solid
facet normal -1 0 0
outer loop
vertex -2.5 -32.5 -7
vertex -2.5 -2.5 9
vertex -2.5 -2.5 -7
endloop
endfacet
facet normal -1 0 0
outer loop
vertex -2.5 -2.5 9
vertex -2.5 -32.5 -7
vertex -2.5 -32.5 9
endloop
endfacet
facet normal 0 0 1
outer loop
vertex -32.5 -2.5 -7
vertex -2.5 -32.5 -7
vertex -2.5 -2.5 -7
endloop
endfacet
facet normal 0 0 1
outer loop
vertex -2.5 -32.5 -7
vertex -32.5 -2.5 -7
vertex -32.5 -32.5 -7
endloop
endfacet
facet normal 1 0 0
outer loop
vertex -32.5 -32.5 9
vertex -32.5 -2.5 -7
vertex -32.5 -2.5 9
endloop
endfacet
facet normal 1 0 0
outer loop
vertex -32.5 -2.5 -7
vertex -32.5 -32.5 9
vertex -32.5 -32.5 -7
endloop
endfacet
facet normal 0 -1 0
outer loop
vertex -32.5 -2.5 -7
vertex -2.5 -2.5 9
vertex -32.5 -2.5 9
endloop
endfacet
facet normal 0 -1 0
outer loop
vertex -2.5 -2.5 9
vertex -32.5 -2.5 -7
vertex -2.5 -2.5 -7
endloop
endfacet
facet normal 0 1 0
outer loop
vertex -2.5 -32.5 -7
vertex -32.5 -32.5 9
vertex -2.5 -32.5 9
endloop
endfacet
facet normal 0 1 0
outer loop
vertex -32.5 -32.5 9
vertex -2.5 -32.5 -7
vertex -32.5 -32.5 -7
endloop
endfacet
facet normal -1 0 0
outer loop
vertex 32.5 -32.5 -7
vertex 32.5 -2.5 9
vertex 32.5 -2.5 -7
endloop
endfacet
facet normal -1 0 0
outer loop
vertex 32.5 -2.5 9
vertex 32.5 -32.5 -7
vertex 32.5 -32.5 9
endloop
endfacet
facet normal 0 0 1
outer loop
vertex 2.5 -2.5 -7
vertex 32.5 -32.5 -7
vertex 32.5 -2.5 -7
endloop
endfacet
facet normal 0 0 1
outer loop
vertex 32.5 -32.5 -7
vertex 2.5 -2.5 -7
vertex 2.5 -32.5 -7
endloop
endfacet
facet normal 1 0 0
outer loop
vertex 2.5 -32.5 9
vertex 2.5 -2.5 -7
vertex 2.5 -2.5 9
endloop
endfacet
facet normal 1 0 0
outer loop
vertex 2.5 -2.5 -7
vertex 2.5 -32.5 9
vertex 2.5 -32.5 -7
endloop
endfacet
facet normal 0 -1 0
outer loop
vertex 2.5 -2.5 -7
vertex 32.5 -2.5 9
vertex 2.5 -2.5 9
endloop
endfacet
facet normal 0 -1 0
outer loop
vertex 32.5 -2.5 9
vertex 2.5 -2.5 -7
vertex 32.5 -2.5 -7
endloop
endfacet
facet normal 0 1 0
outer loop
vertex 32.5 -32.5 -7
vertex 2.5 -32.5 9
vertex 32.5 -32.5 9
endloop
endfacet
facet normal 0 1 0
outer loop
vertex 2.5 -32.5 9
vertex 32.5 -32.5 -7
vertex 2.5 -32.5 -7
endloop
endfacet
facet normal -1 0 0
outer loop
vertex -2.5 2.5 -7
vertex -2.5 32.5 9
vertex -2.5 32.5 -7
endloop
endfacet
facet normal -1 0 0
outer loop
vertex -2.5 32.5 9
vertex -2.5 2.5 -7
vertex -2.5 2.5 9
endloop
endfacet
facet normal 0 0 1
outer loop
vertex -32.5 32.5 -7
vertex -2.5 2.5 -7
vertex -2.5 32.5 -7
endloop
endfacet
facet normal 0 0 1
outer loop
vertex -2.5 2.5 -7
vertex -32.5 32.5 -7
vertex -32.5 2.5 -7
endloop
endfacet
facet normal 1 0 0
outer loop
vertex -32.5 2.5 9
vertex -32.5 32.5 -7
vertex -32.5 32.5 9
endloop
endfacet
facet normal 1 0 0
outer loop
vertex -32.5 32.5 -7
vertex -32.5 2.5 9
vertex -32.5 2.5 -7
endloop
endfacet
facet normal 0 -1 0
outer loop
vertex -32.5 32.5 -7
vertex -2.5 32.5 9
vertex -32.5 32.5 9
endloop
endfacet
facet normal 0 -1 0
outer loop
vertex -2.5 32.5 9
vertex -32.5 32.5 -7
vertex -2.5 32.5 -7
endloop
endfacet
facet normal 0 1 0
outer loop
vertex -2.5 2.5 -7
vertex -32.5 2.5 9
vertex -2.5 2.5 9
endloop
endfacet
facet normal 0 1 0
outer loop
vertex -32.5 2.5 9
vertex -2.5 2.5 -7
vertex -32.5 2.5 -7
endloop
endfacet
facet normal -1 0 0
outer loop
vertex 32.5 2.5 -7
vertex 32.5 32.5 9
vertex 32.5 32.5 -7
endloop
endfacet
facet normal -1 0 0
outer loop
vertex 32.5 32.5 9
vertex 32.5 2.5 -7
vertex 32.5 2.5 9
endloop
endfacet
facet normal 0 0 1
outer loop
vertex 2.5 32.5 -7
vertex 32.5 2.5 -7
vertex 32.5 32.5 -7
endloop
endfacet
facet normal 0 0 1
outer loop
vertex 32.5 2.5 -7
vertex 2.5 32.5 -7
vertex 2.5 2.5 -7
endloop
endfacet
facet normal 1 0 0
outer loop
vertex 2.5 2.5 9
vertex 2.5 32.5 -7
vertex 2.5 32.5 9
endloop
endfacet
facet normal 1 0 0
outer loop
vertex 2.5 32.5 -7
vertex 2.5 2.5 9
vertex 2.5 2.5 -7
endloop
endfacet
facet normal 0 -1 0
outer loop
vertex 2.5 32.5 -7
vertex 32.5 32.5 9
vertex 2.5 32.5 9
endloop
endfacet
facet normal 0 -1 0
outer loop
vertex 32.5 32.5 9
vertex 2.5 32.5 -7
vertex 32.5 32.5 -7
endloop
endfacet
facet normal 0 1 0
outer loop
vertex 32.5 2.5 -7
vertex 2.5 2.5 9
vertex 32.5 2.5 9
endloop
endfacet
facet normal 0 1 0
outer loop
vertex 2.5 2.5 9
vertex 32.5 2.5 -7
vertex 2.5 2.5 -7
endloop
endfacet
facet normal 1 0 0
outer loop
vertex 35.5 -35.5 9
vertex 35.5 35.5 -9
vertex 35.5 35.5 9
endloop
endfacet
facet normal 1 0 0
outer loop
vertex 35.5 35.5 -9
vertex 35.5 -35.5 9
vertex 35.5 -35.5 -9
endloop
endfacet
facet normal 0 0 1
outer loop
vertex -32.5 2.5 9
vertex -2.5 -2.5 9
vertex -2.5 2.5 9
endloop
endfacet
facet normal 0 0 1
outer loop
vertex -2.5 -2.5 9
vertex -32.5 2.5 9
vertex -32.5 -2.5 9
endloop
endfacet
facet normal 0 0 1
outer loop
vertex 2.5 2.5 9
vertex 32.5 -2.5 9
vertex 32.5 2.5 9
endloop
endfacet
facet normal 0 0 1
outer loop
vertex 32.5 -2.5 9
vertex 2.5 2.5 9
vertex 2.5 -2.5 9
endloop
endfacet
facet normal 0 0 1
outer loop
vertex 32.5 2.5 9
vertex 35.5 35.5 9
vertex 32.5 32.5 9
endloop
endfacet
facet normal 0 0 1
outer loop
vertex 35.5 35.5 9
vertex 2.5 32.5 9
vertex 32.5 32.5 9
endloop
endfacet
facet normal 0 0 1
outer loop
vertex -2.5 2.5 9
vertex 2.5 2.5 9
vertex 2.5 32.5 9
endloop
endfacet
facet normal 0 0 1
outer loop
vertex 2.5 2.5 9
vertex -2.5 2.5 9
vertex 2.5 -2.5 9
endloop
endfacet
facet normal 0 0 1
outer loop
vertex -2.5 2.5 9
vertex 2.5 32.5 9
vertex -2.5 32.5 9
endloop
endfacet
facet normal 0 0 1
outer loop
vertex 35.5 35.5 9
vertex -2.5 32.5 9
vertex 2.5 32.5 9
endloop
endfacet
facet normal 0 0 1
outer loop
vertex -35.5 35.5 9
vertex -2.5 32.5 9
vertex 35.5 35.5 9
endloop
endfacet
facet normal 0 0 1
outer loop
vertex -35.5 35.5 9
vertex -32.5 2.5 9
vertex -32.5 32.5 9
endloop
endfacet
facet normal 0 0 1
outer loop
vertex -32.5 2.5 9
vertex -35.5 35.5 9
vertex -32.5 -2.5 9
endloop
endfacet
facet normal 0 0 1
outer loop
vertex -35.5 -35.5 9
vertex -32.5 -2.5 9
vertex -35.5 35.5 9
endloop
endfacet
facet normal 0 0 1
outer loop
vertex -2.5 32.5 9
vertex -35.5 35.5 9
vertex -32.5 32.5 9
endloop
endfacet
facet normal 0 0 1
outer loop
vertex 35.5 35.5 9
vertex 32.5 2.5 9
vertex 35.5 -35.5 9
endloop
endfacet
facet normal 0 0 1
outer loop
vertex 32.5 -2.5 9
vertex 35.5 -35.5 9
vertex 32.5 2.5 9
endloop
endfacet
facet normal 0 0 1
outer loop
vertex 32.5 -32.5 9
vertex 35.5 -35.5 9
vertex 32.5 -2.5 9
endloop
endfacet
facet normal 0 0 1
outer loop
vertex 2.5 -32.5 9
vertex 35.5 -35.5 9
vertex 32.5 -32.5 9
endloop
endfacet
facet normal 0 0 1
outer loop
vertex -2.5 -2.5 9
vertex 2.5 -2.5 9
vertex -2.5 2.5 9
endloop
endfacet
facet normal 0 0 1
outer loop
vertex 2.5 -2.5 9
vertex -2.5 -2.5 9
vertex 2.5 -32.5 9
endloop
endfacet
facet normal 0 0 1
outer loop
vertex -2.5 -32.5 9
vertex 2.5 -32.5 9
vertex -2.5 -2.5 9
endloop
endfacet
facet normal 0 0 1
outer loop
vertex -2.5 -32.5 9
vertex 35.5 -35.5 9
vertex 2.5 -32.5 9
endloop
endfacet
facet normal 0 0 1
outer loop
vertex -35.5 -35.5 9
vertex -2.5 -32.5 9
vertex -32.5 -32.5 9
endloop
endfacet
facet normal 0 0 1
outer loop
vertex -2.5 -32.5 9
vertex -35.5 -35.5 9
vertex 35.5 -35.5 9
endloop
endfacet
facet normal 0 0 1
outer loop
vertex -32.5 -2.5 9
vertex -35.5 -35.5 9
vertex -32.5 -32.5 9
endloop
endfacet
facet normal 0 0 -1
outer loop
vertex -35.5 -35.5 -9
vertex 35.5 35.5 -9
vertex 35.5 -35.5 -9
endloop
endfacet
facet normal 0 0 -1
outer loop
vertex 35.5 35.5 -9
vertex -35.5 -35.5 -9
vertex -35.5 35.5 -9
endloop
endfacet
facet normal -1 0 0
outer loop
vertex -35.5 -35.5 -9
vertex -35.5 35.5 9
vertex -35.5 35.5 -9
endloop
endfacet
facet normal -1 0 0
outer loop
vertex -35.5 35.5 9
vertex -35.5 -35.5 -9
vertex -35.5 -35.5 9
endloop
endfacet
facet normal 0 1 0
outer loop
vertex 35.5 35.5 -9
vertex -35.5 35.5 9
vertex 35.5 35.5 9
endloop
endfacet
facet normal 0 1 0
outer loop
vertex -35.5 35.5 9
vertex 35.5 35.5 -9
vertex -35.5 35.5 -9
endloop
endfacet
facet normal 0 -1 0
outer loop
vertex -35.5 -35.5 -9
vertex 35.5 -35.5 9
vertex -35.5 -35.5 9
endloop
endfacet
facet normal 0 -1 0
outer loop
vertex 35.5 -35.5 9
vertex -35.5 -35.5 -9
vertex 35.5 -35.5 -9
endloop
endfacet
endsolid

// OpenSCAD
$fn = 32;

// ----------------------------------------------------------------------
// Pocket plate 71 x 71 x 18
// 2 x 2 pockets 30 mm square, 16 mm deep
// ----------------------------------------------------------------------

// --- parameters (mm) ---
thickness = 18;  // plate thickness
floor_t = 2;     // material left under each pocket
pocket = 30;     // pocket side length
pitch_x = 35;    // pocket pitch along X
pitch_y = 35;    // pocket pitch along Y
cols = 2;        // pockets per row
rows = 2;        // rows of pockets

// --- derived feature positions (mm) ---
depth = thickness - floor_t;        // = 16   pocket depth, down to the floor
span_x = (cols - 1) * pitch_x;      // = 35   distance between outer pockets
span_y = (rows - 1) * pitch_y;      // = 35   distance between outer pocket rows
origin_x = -span_x / 2;             // = -17.5   X of the first pocket
origin_y = -span_y / 2;             // = -17.5   Y of the first pocket
plate = [span_x + pocket + 6, span_y + pocket + 6, thickness];  // = [71, 71, 18]   overall size: pockets plus 3 mm of wall on each side
feature_centers = [
  [origin_x + 0 * pitch_x, origin_y + 0 * pitch_y],
  [origin_x + 1 * pitch_x, origin_y + 0 * pitch_y],
  [origin_x + 0 * pitch_x, origin_y + 1 * pitch_y],
  [origin_x + 1 * pitch_x, origin_y + 1 * pitch_y]
];   // pocket centres, used verbatim by the cutter loop

// plate outline, then one pocket per centre in feature_centers
difference() {
  cube(plate, center = true);
  for (centre = feature_centers)
    translate([centre[0] - pocket / 2, centre[1] - pocket / 2, plate[2] / 2 - depth])
      cube([pocket, pocket, depth + 1]);  // centred on the declared pocket centre
}
